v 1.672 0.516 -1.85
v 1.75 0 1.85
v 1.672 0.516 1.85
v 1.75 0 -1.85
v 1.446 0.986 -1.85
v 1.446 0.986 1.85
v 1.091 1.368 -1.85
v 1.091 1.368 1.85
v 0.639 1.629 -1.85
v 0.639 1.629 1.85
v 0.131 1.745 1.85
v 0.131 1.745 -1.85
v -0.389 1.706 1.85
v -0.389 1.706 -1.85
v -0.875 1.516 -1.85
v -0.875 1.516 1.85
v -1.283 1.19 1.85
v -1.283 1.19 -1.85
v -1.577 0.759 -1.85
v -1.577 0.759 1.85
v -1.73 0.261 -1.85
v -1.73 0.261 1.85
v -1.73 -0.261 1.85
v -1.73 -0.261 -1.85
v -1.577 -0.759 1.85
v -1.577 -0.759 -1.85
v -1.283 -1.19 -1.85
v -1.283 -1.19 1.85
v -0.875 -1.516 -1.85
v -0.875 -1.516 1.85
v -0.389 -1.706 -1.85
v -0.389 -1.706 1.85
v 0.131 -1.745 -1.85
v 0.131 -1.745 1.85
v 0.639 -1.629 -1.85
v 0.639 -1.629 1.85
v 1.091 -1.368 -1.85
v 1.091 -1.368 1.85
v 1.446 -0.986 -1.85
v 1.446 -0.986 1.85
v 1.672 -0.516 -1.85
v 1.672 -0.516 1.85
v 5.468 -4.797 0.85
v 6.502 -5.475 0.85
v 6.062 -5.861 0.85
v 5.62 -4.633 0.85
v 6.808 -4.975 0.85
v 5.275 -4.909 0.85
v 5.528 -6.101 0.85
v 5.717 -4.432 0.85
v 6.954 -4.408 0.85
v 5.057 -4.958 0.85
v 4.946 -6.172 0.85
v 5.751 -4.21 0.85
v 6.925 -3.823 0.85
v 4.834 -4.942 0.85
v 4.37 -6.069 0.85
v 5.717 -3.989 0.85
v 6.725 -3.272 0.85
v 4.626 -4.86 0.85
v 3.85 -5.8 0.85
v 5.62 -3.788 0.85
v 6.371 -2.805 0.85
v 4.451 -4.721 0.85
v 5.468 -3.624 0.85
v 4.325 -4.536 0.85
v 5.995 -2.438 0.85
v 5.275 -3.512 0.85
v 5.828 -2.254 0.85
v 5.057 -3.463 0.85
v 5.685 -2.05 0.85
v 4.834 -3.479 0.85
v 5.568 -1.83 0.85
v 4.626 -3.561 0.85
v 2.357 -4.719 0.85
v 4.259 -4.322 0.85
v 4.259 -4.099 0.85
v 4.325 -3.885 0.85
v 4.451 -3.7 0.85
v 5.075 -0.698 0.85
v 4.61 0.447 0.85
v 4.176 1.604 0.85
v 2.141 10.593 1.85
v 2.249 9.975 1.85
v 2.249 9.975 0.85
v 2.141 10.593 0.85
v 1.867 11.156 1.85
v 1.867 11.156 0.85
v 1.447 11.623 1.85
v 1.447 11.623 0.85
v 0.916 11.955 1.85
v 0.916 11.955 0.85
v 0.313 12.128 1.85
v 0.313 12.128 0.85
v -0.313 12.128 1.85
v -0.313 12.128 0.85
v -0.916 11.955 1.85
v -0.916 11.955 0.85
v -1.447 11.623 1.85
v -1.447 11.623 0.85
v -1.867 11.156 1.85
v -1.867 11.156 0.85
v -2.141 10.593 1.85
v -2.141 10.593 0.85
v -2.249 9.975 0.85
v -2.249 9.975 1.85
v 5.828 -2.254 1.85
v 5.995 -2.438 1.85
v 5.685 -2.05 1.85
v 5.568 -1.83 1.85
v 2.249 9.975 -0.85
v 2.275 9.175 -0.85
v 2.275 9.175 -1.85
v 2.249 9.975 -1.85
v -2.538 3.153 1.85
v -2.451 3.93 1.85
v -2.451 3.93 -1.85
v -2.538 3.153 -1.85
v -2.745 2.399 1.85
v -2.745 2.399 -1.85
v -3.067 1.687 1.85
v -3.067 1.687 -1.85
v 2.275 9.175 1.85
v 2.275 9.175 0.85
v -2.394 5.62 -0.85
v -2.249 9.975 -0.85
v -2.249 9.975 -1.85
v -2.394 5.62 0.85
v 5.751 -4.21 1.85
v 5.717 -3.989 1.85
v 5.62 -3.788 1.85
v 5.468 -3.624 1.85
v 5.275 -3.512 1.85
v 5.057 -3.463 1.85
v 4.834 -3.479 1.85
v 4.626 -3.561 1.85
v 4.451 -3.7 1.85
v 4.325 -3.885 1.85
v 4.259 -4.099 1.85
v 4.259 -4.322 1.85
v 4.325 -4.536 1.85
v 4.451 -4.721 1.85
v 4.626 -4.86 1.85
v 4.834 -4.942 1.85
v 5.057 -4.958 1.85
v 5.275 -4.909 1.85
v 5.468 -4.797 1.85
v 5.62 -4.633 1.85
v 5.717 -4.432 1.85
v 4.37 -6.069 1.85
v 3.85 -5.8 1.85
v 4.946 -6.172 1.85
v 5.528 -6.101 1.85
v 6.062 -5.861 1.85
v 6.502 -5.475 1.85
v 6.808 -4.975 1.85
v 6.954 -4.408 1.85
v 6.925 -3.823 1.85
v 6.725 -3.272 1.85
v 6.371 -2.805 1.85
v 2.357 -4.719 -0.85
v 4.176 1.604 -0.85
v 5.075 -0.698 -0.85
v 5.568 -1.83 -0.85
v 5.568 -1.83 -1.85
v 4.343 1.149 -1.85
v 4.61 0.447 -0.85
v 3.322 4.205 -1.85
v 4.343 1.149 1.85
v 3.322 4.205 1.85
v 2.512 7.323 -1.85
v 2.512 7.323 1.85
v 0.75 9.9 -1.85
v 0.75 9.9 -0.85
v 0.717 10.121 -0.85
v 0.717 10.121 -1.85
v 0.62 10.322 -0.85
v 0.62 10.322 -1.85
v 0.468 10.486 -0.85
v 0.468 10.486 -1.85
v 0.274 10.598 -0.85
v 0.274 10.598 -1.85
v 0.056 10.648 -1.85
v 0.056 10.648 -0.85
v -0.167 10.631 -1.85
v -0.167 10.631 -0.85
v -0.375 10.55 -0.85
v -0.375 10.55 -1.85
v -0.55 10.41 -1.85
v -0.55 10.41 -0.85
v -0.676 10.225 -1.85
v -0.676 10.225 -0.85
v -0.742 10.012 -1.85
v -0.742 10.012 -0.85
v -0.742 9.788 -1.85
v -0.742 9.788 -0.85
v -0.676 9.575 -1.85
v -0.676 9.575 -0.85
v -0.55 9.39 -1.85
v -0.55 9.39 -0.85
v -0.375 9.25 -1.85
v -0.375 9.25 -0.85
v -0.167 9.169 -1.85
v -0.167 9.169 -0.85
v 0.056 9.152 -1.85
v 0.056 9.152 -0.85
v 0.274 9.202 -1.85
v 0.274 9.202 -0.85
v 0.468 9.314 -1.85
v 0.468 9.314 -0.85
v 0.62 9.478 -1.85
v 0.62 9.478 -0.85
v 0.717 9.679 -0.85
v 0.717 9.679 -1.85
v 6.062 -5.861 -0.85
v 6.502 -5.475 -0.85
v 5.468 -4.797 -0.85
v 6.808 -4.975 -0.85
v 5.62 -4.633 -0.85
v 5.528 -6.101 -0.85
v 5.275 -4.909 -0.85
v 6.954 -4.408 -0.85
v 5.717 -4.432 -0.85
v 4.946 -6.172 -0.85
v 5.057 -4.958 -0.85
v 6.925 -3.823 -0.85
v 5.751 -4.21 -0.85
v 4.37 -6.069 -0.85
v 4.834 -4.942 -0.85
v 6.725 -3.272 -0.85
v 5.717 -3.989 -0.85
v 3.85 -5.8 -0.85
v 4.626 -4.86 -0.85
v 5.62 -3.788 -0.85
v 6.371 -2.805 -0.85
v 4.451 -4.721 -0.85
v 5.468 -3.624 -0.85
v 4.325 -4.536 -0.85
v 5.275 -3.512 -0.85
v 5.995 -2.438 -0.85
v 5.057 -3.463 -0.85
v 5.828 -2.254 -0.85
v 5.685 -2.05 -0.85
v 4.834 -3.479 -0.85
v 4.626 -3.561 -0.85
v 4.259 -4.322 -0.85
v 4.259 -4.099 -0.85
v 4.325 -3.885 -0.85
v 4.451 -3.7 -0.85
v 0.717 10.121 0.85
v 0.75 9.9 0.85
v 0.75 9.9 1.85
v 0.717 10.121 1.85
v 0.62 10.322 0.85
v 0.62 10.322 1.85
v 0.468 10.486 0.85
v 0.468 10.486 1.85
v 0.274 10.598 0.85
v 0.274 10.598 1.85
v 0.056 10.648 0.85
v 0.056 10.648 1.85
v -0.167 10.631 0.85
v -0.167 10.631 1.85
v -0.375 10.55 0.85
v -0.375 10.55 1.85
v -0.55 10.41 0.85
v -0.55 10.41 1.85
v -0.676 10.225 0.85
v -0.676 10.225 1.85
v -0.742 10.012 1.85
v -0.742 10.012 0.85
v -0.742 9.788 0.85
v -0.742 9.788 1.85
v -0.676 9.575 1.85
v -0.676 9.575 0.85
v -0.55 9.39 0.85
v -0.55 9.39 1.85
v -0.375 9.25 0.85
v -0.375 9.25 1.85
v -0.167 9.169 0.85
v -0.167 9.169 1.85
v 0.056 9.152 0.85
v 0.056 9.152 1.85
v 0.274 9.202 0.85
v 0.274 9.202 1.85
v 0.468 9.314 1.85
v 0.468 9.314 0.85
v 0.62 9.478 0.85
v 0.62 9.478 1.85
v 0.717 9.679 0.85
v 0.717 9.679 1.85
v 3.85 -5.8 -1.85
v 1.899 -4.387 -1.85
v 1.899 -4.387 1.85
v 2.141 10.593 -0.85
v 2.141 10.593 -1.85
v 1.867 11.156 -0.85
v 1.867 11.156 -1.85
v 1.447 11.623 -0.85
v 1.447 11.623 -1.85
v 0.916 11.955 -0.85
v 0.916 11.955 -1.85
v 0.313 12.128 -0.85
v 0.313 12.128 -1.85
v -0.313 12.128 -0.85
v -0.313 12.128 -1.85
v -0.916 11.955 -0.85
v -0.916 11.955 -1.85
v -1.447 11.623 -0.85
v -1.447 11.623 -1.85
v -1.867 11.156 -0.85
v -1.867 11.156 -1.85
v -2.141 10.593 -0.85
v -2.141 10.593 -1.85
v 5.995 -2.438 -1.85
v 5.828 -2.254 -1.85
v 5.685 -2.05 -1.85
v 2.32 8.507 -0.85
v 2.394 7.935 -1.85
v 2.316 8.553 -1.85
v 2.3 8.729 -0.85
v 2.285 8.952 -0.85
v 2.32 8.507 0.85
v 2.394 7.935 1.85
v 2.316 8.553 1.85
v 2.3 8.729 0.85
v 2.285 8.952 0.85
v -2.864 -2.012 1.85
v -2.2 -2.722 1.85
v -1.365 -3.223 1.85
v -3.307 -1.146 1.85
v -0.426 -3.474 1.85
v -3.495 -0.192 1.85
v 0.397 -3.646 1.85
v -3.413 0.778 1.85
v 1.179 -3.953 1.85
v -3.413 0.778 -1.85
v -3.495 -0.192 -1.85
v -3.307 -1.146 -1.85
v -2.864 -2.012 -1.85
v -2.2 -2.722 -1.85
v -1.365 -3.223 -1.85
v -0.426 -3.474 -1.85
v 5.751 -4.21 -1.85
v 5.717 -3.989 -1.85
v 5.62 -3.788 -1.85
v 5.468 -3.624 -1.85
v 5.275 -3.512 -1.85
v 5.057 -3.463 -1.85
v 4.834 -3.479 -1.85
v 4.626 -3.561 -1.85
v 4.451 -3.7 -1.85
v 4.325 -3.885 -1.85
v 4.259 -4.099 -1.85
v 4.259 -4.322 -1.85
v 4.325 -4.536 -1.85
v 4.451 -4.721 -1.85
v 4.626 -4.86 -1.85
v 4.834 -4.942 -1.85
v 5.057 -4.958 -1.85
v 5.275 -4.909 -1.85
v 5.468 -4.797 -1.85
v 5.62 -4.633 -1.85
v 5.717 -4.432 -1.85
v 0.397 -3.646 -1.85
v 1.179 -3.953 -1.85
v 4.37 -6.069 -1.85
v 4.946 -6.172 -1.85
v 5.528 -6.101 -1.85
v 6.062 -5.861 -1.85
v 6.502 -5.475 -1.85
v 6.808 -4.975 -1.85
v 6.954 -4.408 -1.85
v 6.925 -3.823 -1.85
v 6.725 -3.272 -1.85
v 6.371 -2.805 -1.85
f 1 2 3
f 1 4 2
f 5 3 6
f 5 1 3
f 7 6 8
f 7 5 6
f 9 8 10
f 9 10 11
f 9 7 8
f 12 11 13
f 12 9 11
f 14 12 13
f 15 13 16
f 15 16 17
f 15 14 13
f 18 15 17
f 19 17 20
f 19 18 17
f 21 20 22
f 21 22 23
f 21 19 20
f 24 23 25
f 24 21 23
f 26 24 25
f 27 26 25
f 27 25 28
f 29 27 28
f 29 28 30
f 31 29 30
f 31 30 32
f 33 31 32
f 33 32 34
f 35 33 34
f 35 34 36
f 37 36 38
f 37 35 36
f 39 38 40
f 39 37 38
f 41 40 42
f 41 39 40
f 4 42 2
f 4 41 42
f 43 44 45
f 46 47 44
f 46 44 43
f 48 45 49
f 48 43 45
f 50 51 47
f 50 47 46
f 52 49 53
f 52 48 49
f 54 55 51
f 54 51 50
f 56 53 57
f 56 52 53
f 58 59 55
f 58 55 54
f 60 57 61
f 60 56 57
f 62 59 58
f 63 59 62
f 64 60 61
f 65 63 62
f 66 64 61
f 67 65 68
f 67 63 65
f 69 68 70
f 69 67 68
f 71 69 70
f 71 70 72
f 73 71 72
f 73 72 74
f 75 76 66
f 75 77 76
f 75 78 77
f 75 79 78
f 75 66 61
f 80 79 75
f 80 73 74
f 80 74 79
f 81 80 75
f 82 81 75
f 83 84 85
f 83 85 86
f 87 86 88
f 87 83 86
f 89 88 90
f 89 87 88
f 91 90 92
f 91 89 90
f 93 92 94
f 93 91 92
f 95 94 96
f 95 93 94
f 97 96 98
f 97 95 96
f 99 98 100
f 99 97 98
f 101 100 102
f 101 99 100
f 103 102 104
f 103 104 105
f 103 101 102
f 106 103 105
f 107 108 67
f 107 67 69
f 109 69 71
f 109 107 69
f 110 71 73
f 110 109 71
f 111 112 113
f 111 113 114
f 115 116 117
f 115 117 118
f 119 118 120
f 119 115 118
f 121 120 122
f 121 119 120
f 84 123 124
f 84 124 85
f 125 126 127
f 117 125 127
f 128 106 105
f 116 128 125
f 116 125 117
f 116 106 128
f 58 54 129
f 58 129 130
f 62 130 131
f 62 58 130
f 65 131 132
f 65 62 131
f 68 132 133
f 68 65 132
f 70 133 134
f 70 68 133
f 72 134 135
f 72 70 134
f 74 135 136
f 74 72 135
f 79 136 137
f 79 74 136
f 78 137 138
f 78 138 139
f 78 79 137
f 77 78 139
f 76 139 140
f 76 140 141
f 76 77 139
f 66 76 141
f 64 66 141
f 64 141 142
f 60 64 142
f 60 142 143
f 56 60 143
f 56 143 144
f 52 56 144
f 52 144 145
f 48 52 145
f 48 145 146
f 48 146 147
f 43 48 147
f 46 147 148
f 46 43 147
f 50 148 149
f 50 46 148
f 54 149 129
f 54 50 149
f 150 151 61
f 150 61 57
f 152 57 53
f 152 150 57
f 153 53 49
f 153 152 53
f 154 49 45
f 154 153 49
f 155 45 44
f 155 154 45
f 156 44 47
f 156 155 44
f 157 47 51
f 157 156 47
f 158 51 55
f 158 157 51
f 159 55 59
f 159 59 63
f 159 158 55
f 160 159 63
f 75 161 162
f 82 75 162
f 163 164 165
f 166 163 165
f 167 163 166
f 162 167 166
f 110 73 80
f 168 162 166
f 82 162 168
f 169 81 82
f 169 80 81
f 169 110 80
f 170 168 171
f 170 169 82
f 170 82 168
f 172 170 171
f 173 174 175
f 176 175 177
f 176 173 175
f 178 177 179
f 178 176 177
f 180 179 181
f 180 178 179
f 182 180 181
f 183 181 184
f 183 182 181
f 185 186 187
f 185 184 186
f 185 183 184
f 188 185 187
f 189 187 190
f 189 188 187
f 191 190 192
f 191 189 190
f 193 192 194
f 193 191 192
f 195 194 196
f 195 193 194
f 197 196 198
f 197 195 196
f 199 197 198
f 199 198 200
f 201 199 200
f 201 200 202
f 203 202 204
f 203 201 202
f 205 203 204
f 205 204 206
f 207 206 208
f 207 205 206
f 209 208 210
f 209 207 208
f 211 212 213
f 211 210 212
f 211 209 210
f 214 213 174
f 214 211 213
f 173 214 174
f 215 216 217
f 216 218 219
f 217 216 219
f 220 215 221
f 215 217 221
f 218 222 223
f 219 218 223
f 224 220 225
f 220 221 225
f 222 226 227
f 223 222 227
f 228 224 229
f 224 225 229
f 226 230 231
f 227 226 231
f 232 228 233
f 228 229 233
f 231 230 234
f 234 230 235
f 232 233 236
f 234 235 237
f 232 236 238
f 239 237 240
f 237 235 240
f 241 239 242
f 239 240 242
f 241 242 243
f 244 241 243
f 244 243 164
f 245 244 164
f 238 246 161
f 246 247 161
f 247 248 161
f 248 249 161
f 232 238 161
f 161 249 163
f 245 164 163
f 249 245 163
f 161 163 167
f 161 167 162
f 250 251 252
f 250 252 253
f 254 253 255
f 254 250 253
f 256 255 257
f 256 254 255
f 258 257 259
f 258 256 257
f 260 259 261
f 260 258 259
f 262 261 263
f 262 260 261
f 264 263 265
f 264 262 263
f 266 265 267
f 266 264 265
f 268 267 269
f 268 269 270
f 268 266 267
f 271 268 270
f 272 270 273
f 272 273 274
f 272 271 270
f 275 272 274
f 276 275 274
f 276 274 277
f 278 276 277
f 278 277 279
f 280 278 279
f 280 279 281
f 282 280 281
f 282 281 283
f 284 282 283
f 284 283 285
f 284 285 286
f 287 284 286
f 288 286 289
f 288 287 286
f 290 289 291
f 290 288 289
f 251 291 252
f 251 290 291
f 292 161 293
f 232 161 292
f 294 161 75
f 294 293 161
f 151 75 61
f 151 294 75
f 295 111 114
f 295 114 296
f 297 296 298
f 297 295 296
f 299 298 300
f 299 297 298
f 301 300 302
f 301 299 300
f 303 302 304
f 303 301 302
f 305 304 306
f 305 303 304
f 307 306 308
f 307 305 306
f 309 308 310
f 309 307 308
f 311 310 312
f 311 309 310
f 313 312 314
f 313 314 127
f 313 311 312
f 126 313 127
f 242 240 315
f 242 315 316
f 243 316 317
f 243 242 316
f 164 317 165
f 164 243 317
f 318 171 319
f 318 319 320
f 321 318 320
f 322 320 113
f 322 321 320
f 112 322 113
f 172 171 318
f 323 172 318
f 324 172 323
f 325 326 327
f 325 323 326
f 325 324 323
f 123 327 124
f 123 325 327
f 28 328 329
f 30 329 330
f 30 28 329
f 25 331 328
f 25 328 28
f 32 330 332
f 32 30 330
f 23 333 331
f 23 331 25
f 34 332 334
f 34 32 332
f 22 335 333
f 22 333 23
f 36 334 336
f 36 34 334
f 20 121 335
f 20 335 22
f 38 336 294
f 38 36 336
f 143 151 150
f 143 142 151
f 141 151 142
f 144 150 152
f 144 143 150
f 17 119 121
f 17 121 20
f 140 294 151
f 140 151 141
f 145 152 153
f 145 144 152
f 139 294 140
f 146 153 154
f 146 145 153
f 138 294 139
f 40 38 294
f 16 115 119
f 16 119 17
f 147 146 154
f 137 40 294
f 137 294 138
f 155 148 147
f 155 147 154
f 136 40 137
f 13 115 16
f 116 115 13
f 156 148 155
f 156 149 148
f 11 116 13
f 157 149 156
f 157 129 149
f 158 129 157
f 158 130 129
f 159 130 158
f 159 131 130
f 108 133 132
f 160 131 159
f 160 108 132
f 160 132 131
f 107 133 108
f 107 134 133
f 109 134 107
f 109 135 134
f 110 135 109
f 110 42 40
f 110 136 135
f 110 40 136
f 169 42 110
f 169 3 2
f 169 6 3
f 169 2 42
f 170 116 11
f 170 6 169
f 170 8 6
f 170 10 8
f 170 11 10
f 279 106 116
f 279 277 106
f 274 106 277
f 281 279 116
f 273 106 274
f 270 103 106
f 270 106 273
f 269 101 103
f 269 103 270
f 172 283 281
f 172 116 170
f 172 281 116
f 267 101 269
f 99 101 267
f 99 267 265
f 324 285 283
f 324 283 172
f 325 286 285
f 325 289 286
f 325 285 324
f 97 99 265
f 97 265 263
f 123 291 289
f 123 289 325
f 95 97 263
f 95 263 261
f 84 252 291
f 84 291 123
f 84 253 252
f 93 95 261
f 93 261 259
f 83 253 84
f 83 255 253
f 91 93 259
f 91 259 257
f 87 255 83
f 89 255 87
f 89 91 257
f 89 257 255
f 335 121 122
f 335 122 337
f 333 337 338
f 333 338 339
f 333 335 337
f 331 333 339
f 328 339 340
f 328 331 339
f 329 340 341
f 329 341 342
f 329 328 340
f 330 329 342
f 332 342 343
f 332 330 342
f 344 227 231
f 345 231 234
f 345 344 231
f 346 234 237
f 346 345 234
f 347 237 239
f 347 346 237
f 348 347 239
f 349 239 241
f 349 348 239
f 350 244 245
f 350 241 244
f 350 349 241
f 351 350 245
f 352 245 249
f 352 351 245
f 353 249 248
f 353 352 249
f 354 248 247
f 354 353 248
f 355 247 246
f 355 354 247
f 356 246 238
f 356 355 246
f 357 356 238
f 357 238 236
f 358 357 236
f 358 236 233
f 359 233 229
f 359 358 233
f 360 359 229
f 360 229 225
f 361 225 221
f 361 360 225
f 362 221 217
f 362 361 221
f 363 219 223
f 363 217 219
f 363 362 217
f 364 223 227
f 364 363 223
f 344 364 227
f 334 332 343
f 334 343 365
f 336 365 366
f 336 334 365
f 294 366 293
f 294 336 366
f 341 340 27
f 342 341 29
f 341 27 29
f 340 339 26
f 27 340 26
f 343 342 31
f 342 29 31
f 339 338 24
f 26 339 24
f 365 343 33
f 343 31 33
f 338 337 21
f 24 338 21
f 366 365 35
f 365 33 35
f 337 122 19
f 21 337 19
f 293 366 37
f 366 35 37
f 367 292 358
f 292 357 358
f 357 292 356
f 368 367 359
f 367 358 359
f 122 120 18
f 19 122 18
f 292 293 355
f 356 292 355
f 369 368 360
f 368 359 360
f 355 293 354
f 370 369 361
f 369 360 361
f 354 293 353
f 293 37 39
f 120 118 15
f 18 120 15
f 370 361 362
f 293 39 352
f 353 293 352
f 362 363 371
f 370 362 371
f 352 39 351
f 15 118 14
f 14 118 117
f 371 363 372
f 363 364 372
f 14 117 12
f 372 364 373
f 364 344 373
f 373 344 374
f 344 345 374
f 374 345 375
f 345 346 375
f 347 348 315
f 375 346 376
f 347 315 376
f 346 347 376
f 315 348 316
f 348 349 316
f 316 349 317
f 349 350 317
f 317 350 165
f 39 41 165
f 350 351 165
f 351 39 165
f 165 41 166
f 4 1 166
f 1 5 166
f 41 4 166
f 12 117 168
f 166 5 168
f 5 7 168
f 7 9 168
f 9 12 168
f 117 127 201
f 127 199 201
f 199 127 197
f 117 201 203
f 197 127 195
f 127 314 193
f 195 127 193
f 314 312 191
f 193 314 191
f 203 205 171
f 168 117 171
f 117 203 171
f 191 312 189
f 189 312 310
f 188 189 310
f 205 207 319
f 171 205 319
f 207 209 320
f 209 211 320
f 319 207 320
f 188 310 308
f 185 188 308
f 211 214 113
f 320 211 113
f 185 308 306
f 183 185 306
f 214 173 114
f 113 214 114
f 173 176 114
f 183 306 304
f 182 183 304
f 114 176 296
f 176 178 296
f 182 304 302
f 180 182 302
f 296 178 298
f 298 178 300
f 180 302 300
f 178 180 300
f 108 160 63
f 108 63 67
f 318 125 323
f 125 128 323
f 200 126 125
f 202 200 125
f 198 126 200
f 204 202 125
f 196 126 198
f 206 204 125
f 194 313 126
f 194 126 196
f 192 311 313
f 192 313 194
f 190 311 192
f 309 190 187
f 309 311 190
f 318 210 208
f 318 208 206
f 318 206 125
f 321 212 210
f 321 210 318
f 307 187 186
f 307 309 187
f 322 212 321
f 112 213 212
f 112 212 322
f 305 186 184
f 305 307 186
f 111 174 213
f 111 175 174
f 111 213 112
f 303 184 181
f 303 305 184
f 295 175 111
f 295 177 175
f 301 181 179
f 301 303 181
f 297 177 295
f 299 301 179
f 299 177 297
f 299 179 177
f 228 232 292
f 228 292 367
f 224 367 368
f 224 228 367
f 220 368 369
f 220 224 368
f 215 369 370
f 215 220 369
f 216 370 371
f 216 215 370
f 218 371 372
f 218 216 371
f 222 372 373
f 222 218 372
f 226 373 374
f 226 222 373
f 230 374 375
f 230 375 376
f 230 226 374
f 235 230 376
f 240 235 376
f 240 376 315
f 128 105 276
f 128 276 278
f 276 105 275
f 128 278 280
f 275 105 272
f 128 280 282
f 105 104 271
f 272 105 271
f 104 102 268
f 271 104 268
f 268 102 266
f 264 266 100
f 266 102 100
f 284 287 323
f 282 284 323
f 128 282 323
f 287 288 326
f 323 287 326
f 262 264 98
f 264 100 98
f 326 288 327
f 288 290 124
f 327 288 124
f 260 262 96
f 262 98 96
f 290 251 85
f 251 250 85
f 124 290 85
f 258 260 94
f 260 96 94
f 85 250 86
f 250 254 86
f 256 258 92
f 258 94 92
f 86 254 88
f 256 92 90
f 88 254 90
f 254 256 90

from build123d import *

# Parameters (mm, degrees)
SKETCH1_R           = 1.75
SKETCH1_R_2         = 0.75
BOSS_EXTRUDE1_DEPTH = 1.85
CUT_EXTRUDE1_DEPTH  = 0.85


with BuildPart() as part:
    # Sketch1 → Boss-Extrude1 (new body, symmetric)
    with BuildSketch(Plane.XY):
        with BuildLine():
            Line((-2.248747058, 9.975077763), (-2.450586667, 3.929529668))
            ThreePointArc((-2.450586667, 3.929529668), (-2.626439392, 2.771809131), (-3.066742144, 1.686740235))
            ThreePointArc((-3.066742144, 1.686740235), (-3.115718571, -1.594458461), (-0.425746012, -3.474009259))
            ThreePointArc((-0.425746012, -3.474009259), (0.794490836, -3.783194285), (1.898835448, -4.387343542))
            Line((1.898835448, -4.387343542), (3.849546842, -5.800104619))
            ThreePointArc((3.849546842, -5.800104619), (6.502194953, -5.474619694), (6.371070446, -2.805296035))
            Line((6.371070446, -2.805296035), (5.994743374, -2.438319573))
            ThreePointArc((5.994743374, -2.438319573), (5.753103265, -2.154083372), (5.568455785, -1.829914483))
            ThreePointArc((5.568455785, -1.829914483), (3.806333847, 2.668506691), (2.511577358, 7.323017665))
            ThreePointArc((2.511577358, 7.323017665), (2.35023388, 8.243248269), (2.275474866, 9.174520072))
            Line((2.275474866, 9.174520072), (2.248747058, 9.975077763))
            ThreePointArc((2.248747058, 9.975077763), (0, 12.15), (-2.248747058, 9.975077763))
        make_face()
        Circle(SKETCH1_R, mode=Mode.SUBTRACT)
        with Locations((0, 9.9)):
            Circle(SKETCH1_R_2, mode=Mode.SUBTRACT)
        with Locations((5.000791037, -4.210490349)):
            Circle(SKETCH1_R_2, mode=Mode.SUBTRACT)
    extrude(amount=BOSS_EXTRUDE1_DEPTH, both=True)

    # Sketch2 → Cut-Extrude1 (cut, symmetric)
    with BuildSketch(Plane.XY):
        Polygon((1.704938045, -6.98647295), (4.176020114, 1.603907731), (8.214802736, -2.706528486), (6.17955487, -9.771778434), align=None)
        Polygon((-2.39415597, 5.619755358), (2.320198625, 8.506541147), (8.539776122, 16.638706119), (-7.891989788, 11.77086667), align=None)
    extrude(amount=CUT_EXTRUDE1_DEPTH, both=True, mode=Mode.SUBTRACT)


solid = part.part
